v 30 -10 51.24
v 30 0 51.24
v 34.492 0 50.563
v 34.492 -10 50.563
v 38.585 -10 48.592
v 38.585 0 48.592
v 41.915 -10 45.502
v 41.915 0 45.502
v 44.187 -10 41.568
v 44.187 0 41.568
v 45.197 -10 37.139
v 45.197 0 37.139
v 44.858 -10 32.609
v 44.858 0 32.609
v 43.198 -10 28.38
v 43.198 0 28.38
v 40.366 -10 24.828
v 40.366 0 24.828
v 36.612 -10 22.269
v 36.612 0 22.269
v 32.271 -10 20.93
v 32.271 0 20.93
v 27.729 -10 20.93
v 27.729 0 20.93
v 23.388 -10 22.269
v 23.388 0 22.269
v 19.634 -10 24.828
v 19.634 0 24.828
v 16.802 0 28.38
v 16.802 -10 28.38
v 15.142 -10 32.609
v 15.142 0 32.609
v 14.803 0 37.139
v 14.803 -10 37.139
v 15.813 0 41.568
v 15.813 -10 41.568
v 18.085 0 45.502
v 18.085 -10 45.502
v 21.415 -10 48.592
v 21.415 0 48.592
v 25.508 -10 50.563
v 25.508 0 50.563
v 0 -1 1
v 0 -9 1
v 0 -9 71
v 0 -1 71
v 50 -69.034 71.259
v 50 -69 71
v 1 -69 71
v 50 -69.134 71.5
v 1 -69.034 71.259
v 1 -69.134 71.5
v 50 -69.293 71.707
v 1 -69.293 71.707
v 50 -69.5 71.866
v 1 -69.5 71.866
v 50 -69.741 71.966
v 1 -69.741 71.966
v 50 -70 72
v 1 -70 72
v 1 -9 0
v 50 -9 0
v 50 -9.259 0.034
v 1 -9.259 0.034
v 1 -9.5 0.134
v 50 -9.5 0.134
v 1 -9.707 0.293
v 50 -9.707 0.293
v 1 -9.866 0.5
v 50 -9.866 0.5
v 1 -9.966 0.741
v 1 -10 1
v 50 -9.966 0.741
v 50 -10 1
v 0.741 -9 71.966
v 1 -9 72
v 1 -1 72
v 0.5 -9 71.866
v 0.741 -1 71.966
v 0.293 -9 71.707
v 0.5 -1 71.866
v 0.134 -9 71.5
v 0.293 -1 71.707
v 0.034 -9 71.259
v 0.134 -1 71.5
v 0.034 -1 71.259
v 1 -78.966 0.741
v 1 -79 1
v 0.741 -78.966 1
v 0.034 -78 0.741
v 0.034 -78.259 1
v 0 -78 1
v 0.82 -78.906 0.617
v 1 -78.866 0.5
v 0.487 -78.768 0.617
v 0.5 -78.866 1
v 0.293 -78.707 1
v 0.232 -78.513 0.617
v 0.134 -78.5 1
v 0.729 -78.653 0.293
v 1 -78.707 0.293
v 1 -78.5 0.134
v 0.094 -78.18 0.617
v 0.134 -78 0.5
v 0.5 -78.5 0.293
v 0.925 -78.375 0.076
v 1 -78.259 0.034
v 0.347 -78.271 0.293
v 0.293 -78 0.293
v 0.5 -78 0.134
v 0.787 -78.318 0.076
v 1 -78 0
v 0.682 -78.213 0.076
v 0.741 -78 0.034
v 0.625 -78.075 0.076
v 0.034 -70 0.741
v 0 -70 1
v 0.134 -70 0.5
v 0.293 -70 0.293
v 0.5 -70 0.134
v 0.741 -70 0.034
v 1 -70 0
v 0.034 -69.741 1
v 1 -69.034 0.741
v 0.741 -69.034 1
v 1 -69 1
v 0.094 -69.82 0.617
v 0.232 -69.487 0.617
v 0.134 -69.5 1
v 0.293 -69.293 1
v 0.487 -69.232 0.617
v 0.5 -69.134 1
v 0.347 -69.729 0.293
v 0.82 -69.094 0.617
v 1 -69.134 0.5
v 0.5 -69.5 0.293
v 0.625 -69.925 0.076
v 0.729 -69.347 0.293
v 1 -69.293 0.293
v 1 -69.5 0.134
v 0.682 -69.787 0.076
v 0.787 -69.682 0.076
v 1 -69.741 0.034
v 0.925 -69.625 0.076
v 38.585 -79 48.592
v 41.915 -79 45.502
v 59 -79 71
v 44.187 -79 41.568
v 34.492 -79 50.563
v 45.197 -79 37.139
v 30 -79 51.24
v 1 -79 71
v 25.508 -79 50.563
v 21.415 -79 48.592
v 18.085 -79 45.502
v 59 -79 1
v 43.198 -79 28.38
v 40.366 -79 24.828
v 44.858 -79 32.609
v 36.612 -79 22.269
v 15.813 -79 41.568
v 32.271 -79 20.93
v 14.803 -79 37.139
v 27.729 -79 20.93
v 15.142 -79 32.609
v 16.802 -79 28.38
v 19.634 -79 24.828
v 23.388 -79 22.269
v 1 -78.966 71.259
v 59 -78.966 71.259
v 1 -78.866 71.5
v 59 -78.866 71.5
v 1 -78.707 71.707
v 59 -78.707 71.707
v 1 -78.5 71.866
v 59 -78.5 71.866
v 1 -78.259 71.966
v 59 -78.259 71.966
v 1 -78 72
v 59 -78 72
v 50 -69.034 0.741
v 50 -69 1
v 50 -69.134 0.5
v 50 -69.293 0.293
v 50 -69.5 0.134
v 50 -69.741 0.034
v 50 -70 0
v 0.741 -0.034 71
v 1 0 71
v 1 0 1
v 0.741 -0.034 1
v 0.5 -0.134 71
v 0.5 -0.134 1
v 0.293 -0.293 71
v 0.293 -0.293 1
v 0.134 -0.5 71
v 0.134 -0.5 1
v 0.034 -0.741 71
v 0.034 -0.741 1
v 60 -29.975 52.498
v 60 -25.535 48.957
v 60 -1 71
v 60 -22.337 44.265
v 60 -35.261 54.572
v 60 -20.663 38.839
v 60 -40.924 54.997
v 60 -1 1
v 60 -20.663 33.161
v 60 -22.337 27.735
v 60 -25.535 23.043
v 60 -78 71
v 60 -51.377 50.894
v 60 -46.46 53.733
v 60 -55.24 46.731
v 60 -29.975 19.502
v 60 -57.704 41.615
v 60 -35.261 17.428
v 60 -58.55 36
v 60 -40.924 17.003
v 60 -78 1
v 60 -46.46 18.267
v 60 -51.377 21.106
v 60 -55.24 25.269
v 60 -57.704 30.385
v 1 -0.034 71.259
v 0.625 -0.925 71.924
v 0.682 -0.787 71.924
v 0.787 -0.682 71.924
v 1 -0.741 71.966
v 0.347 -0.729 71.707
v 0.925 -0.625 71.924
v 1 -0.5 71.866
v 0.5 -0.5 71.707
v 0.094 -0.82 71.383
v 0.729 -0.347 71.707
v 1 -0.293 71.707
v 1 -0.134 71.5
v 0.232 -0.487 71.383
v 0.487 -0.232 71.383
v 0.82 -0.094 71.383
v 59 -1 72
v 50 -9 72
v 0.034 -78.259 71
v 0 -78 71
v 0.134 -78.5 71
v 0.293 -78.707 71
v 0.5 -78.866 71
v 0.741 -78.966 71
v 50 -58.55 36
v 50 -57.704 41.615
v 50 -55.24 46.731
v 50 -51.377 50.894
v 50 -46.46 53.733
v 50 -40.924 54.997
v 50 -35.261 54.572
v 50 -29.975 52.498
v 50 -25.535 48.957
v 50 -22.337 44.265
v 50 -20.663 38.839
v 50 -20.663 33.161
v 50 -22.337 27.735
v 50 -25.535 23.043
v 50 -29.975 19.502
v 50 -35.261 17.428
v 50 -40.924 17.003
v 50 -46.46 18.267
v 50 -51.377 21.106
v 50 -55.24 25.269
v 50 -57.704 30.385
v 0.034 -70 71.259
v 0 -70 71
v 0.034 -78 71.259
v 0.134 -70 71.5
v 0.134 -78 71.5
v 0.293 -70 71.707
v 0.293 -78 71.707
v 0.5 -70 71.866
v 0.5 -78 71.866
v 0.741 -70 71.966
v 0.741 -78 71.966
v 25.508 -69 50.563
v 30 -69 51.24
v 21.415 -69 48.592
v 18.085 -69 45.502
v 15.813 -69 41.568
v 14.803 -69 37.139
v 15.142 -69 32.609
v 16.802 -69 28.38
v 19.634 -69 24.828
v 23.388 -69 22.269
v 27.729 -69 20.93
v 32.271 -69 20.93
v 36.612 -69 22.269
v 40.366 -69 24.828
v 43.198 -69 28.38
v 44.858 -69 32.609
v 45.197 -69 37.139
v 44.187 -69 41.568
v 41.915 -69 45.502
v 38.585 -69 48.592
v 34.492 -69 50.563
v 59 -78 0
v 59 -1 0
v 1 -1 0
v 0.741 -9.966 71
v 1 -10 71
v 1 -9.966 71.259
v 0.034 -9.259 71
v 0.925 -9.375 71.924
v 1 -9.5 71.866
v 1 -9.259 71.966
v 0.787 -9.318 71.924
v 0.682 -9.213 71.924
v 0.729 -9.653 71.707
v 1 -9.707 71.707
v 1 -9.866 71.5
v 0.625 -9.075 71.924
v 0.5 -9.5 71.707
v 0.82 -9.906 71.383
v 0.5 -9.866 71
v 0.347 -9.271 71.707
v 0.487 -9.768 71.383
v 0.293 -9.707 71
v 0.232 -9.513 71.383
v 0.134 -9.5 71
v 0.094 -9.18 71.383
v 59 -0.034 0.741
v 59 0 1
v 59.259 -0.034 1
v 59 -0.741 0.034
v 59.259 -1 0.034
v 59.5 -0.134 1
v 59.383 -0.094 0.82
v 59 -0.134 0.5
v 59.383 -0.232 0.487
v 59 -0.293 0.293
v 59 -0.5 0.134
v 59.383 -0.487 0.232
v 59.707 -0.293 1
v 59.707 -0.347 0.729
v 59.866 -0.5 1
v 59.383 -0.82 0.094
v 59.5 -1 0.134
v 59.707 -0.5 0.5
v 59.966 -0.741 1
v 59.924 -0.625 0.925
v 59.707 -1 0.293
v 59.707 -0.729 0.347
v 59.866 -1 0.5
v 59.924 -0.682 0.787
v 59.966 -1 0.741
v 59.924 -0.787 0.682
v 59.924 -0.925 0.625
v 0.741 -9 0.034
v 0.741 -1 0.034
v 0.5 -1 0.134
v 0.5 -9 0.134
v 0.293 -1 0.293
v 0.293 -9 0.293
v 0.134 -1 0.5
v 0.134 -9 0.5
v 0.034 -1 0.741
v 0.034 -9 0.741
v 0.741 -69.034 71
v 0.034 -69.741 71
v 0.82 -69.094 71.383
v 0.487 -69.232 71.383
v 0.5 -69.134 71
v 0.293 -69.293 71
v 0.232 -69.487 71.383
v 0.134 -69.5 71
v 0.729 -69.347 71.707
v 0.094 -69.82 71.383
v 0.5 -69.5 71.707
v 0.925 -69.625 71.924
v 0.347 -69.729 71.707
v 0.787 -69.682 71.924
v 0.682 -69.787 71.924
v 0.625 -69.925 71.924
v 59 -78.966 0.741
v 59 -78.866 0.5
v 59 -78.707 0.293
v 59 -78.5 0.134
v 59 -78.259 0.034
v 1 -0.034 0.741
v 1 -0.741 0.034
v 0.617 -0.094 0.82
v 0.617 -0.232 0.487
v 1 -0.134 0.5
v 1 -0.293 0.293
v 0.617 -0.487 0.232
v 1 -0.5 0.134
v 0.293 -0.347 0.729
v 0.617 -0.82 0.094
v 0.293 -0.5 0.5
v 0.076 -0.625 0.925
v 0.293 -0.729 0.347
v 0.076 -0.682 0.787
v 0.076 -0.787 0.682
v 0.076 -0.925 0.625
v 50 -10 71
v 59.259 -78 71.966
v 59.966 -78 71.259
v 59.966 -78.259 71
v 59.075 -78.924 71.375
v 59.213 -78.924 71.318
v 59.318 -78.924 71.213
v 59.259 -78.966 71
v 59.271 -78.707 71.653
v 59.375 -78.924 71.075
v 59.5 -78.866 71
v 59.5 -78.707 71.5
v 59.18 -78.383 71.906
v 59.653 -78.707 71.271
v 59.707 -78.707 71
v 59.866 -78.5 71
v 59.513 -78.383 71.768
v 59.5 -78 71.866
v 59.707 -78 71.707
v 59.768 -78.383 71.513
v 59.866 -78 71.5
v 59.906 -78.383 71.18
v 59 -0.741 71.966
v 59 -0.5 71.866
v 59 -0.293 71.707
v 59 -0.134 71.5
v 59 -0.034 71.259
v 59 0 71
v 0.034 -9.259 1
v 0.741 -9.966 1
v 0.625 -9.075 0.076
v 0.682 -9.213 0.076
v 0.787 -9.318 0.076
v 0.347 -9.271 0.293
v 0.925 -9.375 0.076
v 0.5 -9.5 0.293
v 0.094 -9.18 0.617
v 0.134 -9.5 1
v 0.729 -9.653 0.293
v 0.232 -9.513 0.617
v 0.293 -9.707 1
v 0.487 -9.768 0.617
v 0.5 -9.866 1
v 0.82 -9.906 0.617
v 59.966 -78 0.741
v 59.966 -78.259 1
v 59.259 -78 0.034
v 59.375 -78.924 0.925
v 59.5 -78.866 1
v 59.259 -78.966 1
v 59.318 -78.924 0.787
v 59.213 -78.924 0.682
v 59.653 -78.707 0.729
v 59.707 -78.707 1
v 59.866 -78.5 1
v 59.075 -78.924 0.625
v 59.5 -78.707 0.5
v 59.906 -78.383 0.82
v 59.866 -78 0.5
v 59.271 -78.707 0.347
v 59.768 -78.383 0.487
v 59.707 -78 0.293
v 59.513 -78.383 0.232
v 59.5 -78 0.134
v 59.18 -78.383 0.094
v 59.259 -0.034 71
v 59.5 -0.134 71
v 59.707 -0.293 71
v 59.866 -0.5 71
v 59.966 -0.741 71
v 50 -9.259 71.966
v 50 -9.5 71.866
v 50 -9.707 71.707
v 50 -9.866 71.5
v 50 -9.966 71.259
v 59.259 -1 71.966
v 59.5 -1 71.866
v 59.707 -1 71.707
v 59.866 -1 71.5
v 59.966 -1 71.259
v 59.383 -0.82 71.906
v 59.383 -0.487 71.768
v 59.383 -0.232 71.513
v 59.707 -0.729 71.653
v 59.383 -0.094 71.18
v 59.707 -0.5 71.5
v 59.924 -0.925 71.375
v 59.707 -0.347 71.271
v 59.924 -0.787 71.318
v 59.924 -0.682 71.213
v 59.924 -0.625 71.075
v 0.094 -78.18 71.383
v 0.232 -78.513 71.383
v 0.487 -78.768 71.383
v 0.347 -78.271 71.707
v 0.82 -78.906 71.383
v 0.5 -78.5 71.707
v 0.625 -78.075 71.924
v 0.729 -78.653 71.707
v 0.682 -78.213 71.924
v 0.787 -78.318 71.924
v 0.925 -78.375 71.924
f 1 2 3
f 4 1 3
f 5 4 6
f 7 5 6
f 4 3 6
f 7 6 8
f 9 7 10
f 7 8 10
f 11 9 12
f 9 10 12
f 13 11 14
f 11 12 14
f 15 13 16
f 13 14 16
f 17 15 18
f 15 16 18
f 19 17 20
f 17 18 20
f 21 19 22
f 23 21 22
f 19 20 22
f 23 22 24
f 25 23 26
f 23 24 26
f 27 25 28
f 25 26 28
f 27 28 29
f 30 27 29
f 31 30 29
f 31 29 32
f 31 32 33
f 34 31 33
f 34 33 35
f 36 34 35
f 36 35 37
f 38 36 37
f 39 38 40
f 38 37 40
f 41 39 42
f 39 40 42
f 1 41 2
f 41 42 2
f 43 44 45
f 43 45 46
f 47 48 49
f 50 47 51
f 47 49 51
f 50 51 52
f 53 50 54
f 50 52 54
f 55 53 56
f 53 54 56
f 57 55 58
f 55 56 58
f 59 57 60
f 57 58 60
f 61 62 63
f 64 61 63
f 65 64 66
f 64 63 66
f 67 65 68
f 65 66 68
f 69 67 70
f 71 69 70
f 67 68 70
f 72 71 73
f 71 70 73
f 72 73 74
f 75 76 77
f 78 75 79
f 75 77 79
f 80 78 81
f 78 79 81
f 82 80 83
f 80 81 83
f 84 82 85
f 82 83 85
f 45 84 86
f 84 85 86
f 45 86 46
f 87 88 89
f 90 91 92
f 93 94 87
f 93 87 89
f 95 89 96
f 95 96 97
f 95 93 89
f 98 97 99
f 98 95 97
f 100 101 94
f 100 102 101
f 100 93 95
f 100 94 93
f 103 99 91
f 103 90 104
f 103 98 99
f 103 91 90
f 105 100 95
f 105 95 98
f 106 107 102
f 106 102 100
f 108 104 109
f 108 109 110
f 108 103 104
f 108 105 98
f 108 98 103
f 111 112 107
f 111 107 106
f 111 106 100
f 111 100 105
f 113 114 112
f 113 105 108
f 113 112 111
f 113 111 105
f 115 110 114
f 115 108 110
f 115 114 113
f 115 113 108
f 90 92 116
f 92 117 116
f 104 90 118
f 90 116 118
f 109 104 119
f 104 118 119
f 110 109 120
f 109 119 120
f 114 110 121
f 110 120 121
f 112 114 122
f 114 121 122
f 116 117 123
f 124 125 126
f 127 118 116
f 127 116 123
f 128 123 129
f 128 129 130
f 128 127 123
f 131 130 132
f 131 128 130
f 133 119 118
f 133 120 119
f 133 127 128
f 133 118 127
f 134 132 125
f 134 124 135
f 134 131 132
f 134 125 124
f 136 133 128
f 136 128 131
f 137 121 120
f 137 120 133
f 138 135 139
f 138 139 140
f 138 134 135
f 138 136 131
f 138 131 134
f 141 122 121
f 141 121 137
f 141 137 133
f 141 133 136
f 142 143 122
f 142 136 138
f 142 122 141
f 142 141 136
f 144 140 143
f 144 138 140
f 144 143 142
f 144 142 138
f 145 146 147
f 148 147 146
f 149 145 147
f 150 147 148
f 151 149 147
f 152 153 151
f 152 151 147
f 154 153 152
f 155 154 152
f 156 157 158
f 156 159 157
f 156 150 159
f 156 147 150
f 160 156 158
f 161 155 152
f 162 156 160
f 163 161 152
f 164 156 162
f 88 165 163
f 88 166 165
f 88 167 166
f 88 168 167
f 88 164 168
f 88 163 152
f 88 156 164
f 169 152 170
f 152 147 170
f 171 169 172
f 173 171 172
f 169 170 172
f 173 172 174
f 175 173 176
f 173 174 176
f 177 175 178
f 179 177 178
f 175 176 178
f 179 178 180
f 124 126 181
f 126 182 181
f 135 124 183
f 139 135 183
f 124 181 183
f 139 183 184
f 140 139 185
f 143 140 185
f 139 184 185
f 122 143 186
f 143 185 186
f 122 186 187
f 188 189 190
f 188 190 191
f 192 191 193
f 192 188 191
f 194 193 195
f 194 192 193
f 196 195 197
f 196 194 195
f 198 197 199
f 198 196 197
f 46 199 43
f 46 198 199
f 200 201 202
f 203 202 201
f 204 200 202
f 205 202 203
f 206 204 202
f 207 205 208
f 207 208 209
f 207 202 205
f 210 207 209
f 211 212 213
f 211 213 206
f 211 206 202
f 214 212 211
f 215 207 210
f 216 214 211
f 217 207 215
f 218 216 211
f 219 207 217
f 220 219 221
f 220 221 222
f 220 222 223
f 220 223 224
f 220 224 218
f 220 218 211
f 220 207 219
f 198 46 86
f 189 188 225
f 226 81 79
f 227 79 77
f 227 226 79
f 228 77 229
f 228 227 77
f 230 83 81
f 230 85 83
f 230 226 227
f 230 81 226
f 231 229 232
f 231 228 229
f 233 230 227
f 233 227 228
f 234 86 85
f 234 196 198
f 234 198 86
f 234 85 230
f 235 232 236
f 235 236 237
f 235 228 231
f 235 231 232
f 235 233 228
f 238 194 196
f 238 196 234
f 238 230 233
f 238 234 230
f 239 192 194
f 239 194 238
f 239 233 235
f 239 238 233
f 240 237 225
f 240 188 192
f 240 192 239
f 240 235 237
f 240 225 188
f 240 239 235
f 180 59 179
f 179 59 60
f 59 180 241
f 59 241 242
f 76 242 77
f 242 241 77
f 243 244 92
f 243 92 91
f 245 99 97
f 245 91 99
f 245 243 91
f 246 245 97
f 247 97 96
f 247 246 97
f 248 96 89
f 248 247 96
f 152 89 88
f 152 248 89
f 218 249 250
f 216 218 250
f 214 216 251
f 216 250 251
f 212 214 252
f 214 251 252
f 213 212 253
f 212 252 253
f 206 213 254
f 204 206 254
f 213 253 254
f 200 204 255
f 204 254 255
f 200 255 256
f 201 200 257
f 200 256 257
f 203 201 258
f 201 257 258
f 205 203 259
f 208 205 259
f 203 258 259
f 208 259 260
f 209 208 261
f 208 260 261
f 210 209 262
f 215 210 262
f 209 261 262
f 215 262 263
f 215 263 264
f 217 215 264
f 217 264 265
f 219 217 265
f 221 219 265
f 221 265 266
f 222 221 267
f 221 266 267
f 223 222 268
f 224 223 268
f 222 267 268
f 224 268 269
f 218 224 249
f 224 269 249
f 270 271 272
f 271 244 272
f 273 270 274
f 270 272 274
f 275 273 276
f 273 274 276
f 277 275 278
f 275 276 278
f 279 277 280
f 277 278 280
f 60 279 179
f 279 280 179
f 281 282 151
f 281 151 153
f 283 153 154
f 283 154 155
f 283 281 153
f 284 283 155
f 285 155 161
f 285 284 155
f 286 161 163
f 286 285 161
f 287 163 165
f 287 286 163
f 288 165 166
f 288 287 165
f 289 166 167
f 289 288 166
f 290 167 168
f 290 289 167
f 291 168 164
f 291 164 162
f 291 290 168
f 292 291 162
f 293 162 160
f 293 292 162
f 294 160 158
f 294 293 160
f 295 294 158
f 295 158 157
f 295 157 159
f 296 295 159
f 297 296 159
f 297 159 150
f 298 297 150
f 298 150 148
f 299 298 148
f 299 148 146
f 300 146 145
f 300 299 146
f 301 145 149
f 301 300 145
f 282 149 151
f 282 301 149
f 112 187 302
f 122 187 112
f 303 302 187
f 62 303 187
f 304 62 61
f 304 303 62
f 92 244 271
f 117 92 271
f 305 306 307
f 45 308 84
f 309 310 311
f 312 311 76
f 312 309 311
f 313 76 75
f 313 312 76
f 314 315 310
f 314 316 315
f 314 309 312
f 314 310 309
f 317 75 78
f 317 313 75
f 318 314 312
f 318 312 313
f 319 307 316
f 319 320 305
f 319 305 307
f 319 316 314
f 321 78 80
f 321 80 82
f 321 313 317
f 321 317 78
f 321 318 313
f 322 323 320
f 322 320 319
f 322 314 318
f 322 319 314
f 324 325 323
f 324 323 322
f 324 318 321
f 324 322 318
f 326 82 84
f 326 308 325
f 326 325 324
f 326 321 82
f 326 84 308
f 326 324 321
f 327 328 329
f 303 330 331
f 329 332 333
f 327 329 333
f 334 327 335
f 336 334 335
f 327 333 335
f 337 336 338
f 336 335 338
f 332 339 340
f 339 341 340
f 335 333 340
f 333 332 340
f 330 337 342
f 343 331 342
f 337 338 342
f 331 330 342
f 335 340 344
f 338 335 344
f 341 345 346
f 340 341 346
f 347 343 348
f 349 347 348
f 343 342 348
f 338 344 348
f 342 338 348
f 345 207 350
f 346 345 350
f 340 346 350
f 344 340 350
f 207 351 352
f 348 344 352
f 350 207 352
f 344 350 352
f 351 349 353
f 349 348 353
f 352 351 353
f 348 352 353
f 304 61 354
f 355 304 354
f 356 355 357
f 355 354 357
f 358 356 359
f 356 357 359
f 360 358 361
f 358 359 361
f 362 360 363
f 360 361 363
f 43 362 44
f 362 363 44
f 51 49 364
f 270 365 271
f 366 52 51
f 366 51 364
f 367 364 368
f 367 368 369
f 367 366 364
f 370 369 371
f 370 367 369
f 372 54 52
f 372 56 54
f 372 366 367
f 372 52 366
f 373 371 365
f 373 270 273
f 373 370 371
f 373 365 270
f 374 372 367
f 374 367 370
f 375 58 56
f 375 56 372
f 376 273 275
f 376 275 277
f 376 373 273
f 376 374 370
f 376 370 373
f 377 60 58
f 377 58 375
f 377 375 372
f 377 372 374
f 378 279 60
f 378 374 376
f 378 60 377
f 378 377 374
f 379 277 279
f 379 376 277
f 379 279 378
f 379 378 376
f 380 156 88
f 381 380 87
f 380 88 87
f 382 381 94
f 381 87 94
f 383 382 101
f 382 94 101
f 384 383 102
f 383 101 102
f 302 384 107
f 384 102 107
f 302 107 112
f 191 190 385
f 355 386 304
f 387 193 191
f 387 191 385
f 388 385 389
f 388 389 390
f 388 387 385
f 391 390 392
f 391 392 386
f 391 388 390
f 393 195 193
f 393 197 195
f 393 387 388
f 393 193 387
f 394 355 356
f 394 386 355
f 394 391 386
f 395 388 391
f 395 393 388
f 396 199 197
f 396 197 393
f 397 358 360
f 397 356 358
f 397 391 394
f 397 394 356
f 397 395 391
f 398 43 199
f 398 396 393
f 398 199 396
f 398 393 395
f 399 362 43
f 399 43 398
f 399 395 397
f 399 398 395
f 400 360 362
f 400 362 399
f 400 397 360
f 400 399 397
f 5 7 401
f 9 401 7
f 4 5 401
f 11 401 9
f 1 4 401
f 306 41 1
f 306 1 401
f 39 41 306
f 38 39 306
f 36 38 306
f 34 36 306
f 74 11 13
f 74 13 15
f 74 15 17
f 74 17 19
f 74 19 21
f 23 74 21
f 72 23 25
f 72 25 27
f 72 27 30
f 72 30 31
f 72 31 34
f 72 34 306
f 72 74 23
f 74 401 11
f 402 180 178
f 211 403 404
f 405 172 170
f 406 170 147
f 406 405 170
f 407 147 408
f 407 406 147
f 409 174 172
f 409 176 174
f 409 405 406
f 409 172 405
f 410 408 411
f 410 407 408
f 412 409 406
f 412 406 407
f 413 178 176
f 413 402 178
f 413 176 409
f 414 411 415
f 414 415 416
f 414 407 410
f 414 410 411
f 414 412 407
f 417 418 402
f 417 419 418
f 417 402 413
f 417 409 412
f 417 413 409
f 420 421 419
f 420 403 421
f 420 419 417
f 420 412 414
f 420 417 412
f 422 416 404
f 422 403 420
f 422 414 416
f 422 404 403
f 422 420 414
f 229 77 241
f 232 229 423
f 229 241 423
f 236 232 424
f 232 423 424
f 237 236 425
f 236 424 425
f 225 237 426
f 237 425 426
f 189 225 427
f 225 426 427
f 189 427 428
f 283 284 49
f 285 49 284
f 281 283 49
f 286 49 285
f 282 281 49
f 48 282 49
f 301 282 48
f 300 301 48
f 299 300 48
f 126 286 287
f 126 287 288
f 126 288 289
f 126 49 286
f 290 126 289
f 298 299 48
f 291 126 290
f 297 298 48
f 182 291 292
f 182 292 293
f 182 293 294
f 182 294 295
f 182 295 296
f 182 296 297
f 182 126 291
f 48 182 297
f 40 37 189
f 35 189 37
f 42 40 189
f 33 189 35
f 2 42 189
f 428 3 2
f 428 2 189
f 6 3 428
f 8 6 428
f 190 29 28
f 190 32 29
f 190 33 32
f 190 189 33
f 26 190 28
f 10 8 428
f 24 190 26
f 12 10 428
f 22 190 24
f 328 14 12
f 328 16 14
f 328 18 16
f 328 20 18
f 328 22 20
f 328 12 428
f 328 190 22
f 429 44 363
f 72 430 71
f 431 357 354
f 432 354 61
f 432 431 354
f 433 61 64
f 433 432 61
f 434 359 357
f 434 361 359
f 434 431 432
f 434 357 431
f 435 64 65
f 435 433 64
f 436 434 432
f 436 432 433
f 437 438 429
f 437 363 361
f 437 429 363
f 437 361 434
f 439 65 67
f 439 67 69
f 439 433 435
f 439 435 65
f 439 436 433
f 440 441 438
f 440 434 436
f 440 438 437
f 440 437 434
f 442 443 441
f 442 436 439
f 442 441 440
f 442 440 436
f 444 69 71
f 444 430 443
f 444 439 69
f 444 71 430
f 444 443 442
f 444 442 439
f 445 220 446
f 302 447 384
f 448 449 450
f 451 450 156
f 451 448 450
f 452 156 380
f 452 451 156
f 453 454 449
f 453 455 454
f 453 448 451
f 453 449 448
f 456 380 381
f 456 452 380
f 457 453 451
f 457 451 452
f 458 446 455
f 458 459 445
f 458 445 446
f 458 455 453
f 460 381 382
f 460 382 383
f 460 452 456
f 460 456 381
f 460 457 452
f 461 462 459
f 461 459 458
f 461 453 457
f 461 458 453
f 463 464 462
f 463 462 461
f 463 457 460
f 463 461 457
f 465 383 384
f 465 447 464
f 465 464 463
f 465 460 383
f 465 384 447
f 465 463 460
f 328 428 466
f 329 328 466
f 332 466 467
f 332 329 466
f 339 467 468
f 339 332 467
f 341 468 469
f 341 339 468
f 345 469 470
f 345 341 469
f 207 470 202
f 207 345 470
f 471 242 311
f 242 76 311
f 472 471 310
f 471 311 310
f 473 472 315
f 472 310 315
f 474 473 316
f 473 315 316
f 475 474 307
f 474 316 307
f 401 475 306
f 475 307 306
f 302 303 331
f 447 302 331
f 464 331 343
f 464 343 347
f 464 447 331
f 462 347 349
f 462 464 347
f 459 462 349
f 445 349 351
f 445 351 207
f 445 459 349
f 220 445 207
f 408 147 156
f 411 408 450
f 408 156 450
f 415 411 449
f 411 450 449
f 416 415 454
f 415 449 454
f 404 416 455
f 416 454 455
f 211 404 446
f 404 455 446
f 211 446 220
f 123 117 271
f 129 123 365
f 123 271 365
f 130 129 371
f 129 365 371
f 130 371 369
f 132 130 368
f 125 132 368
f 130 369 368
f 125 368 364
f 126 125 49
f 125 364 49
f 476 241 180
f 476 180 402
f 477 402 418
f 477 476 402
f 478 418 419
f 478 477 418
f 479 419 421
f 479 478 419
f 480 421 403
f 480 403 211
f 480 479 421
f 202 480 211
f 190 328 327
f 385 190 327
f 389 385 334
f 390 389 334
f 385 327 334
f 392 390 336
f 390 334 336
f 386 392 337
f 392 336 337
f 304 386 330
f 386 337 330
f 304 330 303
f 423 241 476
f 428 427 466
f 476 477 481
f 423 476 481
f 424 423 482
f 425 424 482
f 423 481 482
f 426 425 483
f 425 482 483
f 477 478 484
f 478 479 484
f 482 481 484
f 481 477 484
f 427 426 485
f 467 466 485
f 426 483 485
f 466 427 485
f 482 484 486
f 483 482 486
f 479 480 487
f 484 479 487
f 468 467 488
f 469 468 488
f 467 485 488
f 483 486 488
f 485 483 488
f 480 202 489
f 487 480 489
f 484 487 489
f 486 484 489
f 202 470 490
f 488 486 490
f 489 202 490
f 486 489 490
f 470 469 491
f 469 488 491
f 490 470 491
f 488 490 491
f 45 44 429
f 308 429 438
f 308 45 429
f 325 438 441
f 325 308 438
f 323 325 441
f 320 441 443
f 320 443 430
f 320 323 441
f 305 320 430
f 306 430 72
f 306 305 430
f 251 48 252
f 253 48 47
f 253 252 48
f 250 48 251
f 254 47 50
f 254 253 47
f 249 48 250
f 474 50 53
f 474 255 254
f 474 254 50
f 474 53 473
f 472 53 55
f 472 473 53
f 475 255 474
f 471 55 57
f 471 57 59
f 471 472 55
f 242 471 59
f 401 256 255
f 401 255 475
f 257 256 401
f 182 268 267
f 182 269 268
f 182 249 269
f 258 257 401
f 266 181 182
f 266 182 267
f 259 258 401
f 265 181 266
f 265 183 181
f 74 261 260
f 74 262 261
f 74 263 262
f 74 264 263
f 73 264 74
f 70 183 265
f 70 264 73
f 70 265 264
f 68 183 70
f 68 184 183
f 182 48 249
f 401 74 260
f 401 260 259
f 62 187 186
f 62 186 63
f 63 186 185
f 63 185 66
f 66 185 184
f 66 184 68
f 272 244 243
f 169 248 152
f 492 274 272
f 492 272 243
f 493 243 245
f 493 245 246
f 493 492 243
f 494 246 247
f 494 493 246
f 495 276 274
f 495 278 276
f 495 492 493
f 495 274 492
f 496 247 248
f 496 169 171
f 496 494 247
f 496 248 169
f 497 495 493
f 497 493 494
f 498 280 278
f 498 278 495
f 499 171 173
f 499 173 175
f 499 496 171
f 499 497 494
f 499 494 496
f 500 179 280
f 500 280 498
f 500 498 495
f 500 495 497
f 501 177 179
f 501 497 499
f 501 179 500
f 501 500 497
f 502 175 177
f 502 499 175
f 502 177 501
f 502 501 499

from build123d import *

# Parameters (mm, degrees)
EXTRUDE_THIN1_DEPTH = 72
SKETCH2_R           = 15.24
CUT_EXTRUDE2_DEPTH  = 10
CUT_EXTRUDE3_START  = -10
SKETCH3_R           = 15.24
CUT_EXTRUDE3_DEPTH  = 10
SKETCH6_R           = 19.05
CUT_EXTRUDE4_DEPTH  = 10
FILLET2_R           = 1
FILLET3_R           = 1
FILLET4_R           = 1
FILLET5_R           = 1
FILLET6_R           = 1
FILLET7_R           = 1
FILLET8_R           = 1
FILLET9_R           = 1


with BuildPart() as part:
    # Sketch1 → Extrude-Thin1 (new body)
    with BuildSketch(Plane.XY):
        Polygon((0, 0), (60, 0), (60, -79), (0, -79), (0, -69), (50, -69), (50, -10), (0, -10), align=None)
    extrude(amount=EXTRUDE_THIN1_DEPTH)

    # Sketch2 → Cut-Extrude2 (cut)
    with BuildSketch(Plane(origin=(0, 0, 0), x_dir=(1, 0, 0), z_dir=(0, 1, 0))):
        with Locations(Location((30, -36, 0), (0, 0, 270))):
            Circle(SKETCH2_R)
    extrude(amount=-CUT_EXTRUDE2_DEPTH, mode=Mode.SUBTRACT)

    # Sketch3 → Cut-Extrude3 (cut)
    with BuildSketch(Plane.XZ.offset(79).offset(CUT_EXTRUDE3_START)):
        with Locations(Location((30, 36, 0), (0, 0, 90))):
            Circle(SKETCH3_R)
    extrude(amount=CUT_EXTRUDE3_DEPTH, mode=Mode.SUBTRACT)

    # Sketch6 → Cut-Extrude4 (cut)
    with BuildSketch(Plane.ZY.offset(-50)):
        with Locations(Location((36, -39.5, 0), (0, 0, 270))):
            Circle(SKETCH6_R)
    extrude(amount=-CUT_EXTRUDE4_DEPTH, mode=Mode.SUBTRACT)

    # Fillet2
    fillet2_edges = [part.edges().sort_by_distance(p)[0] for p in [
        (0, 0, 36),
        (30, 0, 0),
    ]]
    fillet(fillet2_edges, radius=FILLET2_R)

    # Fillet3
    fillet3_edges = [part.edges().sort_by_distance(p)[0] for p in [
        (0, -10, 36),
    ]]
    fillet(fillet3_edges, radius=FILLET3_R)

    # Fillet4
    # the kernel refuses this fillet: 1 mm, written as the material it takes off along each edge
    with BuildSketch(Plane(origin=(1, -1, 1), x_dir=(0, 0, -1), z_dir=(-1, 0, 0))) as fillet4_piece_1_section:
        Polygon((0, 0), (FILLET4_R, 0), (FILLET4_R, -FILLET4_R), (0, -FILLET4_R), align=None)
    fillet4_piece_1 = extrude(amount=FILLET4_R, mode=Mode.PRIVATE)
    fillet4_piece_1 = fillet4_piece_1 - Plane(origin=(1, -1, 1), x_dir=(0, -0.7071067811865475, 0.7071067811865475), z_dir=(-1, 0, 0)) * Sphere(FILLET4_R, mode=Mode.PRIVATE)
    add(fillet4_piece_1, mode=Mode.SUBTRACT)
    with BuildSketch(Plane(origin=(50, -10, 0), x_dir=(0, 0, 1), z_dir=(-1, 0, 0))) as fillet4_piece_2:
        with BuildLine():
            CenterArc((FILLET4_R, FILLET4_R), FILLET4_R, 180, 90)
            Line((0, FILLET4_R), (0, 0))
            Line((0, 0), (FILLET4_R, 0))
        make_face()
    extrude(amount=49, mode=Mode.SUBTRACT)
    with BuildSketch(Plane(origin=(0, -9, 0), x_dir=(0, 0, 1), z_dir=(0, 1, 0))) as fillet4_piece_3:
        with BuildLine():
            CenterArc((FILLET4_R, FILLET4_R), FILLET4_R, 180, 90)
            Line((0, FILLET4_R), (0, 0))
            Line((0, 0), (FILLET4_R, 0))
        make_face()
    extrude(amount=8, mode=Mode.SUBTRACT)
    with BuildSketch(Plane(origin=(1, -9, 0), x_dir=(-1, 0, 0), z_dir=(0, 1, 0))) as fillet4_piece_4:
        with BuildLine():
            CenterArc((1 - FILLET4_R, FILLET4_R), FILLET4_R, 270, 90)
            Line((1 - FILLET4_R, 0), (1, 0))
            Line((1, 0), (1, FILLET4_R))
        make_face()
    revolve(axis=Axis((1, -9, 0), (0, 0, 1)), revolution_arc=90, mode=Mode.SUBTRACT)

    # Fillet5
    fillet5_edges = [part.edges().sort_by_distance(p)[0] for p in [
        (30.5, 0, 72),
        (0.292893219, -0.292893219, 72),
        (25.5, -10, 72),
        (0, -5, 72),
        (0.292893219, -9.707106781, 72),
    ]]
    fillet(fillet5_edges, radius=FILLET5_R)

    # Fillet6
    fillet6_edges = [part.edges().sort_by_distance(p)[0] for p in [
        (60, -40, 0),
        (60, -0.292893219, 0.292893219),
        (60, -40, 72),
        (60, 0, 36),
        (60, -0.292893219, 71.707106781),
    ]]
    fillet(fillet6_edges, radius=FILLET6_R)

    # Fillet7
    fillet7_edges = [part.edges().sort_by_distance(p)[0] for p in [
        (0, -69, 36),
    ]]
    fillet(fillet7_edges, radius=FILLET7_R)

    # Fillet8
    fillet8_edges = [part.edges().sort_by_distance(p)[0] for p in [
        (0, -79, 36),
    ]]
    fillet(fillet8_edges, radius=FILLET8_R)

    # Fillet9
    fillet9_edges = [part.edges().sort_by_distance(p)[0] for p in [
        (0.292893219, -69.292893219, 0),
        (0.292893219, -69.292893219, 72),
        (0, -74, 0),
        (0.292893219, -78.707106781, 0),
        (0, -74, 72),
        (0.292893219, -78.707106781, 72),
        (25.5, -69, 72),
        (60, -79, 36),
        (30, -79, 0),
        (25.5, -69, 0),
        (30, -79, 72),
        (59.707106781, -79, 0.292893219),
        (59.707106781, -79, 71.707106781),
    ]]
    fillet(fillet9_edges, radius=FILLET9_R)


solid = part.part
